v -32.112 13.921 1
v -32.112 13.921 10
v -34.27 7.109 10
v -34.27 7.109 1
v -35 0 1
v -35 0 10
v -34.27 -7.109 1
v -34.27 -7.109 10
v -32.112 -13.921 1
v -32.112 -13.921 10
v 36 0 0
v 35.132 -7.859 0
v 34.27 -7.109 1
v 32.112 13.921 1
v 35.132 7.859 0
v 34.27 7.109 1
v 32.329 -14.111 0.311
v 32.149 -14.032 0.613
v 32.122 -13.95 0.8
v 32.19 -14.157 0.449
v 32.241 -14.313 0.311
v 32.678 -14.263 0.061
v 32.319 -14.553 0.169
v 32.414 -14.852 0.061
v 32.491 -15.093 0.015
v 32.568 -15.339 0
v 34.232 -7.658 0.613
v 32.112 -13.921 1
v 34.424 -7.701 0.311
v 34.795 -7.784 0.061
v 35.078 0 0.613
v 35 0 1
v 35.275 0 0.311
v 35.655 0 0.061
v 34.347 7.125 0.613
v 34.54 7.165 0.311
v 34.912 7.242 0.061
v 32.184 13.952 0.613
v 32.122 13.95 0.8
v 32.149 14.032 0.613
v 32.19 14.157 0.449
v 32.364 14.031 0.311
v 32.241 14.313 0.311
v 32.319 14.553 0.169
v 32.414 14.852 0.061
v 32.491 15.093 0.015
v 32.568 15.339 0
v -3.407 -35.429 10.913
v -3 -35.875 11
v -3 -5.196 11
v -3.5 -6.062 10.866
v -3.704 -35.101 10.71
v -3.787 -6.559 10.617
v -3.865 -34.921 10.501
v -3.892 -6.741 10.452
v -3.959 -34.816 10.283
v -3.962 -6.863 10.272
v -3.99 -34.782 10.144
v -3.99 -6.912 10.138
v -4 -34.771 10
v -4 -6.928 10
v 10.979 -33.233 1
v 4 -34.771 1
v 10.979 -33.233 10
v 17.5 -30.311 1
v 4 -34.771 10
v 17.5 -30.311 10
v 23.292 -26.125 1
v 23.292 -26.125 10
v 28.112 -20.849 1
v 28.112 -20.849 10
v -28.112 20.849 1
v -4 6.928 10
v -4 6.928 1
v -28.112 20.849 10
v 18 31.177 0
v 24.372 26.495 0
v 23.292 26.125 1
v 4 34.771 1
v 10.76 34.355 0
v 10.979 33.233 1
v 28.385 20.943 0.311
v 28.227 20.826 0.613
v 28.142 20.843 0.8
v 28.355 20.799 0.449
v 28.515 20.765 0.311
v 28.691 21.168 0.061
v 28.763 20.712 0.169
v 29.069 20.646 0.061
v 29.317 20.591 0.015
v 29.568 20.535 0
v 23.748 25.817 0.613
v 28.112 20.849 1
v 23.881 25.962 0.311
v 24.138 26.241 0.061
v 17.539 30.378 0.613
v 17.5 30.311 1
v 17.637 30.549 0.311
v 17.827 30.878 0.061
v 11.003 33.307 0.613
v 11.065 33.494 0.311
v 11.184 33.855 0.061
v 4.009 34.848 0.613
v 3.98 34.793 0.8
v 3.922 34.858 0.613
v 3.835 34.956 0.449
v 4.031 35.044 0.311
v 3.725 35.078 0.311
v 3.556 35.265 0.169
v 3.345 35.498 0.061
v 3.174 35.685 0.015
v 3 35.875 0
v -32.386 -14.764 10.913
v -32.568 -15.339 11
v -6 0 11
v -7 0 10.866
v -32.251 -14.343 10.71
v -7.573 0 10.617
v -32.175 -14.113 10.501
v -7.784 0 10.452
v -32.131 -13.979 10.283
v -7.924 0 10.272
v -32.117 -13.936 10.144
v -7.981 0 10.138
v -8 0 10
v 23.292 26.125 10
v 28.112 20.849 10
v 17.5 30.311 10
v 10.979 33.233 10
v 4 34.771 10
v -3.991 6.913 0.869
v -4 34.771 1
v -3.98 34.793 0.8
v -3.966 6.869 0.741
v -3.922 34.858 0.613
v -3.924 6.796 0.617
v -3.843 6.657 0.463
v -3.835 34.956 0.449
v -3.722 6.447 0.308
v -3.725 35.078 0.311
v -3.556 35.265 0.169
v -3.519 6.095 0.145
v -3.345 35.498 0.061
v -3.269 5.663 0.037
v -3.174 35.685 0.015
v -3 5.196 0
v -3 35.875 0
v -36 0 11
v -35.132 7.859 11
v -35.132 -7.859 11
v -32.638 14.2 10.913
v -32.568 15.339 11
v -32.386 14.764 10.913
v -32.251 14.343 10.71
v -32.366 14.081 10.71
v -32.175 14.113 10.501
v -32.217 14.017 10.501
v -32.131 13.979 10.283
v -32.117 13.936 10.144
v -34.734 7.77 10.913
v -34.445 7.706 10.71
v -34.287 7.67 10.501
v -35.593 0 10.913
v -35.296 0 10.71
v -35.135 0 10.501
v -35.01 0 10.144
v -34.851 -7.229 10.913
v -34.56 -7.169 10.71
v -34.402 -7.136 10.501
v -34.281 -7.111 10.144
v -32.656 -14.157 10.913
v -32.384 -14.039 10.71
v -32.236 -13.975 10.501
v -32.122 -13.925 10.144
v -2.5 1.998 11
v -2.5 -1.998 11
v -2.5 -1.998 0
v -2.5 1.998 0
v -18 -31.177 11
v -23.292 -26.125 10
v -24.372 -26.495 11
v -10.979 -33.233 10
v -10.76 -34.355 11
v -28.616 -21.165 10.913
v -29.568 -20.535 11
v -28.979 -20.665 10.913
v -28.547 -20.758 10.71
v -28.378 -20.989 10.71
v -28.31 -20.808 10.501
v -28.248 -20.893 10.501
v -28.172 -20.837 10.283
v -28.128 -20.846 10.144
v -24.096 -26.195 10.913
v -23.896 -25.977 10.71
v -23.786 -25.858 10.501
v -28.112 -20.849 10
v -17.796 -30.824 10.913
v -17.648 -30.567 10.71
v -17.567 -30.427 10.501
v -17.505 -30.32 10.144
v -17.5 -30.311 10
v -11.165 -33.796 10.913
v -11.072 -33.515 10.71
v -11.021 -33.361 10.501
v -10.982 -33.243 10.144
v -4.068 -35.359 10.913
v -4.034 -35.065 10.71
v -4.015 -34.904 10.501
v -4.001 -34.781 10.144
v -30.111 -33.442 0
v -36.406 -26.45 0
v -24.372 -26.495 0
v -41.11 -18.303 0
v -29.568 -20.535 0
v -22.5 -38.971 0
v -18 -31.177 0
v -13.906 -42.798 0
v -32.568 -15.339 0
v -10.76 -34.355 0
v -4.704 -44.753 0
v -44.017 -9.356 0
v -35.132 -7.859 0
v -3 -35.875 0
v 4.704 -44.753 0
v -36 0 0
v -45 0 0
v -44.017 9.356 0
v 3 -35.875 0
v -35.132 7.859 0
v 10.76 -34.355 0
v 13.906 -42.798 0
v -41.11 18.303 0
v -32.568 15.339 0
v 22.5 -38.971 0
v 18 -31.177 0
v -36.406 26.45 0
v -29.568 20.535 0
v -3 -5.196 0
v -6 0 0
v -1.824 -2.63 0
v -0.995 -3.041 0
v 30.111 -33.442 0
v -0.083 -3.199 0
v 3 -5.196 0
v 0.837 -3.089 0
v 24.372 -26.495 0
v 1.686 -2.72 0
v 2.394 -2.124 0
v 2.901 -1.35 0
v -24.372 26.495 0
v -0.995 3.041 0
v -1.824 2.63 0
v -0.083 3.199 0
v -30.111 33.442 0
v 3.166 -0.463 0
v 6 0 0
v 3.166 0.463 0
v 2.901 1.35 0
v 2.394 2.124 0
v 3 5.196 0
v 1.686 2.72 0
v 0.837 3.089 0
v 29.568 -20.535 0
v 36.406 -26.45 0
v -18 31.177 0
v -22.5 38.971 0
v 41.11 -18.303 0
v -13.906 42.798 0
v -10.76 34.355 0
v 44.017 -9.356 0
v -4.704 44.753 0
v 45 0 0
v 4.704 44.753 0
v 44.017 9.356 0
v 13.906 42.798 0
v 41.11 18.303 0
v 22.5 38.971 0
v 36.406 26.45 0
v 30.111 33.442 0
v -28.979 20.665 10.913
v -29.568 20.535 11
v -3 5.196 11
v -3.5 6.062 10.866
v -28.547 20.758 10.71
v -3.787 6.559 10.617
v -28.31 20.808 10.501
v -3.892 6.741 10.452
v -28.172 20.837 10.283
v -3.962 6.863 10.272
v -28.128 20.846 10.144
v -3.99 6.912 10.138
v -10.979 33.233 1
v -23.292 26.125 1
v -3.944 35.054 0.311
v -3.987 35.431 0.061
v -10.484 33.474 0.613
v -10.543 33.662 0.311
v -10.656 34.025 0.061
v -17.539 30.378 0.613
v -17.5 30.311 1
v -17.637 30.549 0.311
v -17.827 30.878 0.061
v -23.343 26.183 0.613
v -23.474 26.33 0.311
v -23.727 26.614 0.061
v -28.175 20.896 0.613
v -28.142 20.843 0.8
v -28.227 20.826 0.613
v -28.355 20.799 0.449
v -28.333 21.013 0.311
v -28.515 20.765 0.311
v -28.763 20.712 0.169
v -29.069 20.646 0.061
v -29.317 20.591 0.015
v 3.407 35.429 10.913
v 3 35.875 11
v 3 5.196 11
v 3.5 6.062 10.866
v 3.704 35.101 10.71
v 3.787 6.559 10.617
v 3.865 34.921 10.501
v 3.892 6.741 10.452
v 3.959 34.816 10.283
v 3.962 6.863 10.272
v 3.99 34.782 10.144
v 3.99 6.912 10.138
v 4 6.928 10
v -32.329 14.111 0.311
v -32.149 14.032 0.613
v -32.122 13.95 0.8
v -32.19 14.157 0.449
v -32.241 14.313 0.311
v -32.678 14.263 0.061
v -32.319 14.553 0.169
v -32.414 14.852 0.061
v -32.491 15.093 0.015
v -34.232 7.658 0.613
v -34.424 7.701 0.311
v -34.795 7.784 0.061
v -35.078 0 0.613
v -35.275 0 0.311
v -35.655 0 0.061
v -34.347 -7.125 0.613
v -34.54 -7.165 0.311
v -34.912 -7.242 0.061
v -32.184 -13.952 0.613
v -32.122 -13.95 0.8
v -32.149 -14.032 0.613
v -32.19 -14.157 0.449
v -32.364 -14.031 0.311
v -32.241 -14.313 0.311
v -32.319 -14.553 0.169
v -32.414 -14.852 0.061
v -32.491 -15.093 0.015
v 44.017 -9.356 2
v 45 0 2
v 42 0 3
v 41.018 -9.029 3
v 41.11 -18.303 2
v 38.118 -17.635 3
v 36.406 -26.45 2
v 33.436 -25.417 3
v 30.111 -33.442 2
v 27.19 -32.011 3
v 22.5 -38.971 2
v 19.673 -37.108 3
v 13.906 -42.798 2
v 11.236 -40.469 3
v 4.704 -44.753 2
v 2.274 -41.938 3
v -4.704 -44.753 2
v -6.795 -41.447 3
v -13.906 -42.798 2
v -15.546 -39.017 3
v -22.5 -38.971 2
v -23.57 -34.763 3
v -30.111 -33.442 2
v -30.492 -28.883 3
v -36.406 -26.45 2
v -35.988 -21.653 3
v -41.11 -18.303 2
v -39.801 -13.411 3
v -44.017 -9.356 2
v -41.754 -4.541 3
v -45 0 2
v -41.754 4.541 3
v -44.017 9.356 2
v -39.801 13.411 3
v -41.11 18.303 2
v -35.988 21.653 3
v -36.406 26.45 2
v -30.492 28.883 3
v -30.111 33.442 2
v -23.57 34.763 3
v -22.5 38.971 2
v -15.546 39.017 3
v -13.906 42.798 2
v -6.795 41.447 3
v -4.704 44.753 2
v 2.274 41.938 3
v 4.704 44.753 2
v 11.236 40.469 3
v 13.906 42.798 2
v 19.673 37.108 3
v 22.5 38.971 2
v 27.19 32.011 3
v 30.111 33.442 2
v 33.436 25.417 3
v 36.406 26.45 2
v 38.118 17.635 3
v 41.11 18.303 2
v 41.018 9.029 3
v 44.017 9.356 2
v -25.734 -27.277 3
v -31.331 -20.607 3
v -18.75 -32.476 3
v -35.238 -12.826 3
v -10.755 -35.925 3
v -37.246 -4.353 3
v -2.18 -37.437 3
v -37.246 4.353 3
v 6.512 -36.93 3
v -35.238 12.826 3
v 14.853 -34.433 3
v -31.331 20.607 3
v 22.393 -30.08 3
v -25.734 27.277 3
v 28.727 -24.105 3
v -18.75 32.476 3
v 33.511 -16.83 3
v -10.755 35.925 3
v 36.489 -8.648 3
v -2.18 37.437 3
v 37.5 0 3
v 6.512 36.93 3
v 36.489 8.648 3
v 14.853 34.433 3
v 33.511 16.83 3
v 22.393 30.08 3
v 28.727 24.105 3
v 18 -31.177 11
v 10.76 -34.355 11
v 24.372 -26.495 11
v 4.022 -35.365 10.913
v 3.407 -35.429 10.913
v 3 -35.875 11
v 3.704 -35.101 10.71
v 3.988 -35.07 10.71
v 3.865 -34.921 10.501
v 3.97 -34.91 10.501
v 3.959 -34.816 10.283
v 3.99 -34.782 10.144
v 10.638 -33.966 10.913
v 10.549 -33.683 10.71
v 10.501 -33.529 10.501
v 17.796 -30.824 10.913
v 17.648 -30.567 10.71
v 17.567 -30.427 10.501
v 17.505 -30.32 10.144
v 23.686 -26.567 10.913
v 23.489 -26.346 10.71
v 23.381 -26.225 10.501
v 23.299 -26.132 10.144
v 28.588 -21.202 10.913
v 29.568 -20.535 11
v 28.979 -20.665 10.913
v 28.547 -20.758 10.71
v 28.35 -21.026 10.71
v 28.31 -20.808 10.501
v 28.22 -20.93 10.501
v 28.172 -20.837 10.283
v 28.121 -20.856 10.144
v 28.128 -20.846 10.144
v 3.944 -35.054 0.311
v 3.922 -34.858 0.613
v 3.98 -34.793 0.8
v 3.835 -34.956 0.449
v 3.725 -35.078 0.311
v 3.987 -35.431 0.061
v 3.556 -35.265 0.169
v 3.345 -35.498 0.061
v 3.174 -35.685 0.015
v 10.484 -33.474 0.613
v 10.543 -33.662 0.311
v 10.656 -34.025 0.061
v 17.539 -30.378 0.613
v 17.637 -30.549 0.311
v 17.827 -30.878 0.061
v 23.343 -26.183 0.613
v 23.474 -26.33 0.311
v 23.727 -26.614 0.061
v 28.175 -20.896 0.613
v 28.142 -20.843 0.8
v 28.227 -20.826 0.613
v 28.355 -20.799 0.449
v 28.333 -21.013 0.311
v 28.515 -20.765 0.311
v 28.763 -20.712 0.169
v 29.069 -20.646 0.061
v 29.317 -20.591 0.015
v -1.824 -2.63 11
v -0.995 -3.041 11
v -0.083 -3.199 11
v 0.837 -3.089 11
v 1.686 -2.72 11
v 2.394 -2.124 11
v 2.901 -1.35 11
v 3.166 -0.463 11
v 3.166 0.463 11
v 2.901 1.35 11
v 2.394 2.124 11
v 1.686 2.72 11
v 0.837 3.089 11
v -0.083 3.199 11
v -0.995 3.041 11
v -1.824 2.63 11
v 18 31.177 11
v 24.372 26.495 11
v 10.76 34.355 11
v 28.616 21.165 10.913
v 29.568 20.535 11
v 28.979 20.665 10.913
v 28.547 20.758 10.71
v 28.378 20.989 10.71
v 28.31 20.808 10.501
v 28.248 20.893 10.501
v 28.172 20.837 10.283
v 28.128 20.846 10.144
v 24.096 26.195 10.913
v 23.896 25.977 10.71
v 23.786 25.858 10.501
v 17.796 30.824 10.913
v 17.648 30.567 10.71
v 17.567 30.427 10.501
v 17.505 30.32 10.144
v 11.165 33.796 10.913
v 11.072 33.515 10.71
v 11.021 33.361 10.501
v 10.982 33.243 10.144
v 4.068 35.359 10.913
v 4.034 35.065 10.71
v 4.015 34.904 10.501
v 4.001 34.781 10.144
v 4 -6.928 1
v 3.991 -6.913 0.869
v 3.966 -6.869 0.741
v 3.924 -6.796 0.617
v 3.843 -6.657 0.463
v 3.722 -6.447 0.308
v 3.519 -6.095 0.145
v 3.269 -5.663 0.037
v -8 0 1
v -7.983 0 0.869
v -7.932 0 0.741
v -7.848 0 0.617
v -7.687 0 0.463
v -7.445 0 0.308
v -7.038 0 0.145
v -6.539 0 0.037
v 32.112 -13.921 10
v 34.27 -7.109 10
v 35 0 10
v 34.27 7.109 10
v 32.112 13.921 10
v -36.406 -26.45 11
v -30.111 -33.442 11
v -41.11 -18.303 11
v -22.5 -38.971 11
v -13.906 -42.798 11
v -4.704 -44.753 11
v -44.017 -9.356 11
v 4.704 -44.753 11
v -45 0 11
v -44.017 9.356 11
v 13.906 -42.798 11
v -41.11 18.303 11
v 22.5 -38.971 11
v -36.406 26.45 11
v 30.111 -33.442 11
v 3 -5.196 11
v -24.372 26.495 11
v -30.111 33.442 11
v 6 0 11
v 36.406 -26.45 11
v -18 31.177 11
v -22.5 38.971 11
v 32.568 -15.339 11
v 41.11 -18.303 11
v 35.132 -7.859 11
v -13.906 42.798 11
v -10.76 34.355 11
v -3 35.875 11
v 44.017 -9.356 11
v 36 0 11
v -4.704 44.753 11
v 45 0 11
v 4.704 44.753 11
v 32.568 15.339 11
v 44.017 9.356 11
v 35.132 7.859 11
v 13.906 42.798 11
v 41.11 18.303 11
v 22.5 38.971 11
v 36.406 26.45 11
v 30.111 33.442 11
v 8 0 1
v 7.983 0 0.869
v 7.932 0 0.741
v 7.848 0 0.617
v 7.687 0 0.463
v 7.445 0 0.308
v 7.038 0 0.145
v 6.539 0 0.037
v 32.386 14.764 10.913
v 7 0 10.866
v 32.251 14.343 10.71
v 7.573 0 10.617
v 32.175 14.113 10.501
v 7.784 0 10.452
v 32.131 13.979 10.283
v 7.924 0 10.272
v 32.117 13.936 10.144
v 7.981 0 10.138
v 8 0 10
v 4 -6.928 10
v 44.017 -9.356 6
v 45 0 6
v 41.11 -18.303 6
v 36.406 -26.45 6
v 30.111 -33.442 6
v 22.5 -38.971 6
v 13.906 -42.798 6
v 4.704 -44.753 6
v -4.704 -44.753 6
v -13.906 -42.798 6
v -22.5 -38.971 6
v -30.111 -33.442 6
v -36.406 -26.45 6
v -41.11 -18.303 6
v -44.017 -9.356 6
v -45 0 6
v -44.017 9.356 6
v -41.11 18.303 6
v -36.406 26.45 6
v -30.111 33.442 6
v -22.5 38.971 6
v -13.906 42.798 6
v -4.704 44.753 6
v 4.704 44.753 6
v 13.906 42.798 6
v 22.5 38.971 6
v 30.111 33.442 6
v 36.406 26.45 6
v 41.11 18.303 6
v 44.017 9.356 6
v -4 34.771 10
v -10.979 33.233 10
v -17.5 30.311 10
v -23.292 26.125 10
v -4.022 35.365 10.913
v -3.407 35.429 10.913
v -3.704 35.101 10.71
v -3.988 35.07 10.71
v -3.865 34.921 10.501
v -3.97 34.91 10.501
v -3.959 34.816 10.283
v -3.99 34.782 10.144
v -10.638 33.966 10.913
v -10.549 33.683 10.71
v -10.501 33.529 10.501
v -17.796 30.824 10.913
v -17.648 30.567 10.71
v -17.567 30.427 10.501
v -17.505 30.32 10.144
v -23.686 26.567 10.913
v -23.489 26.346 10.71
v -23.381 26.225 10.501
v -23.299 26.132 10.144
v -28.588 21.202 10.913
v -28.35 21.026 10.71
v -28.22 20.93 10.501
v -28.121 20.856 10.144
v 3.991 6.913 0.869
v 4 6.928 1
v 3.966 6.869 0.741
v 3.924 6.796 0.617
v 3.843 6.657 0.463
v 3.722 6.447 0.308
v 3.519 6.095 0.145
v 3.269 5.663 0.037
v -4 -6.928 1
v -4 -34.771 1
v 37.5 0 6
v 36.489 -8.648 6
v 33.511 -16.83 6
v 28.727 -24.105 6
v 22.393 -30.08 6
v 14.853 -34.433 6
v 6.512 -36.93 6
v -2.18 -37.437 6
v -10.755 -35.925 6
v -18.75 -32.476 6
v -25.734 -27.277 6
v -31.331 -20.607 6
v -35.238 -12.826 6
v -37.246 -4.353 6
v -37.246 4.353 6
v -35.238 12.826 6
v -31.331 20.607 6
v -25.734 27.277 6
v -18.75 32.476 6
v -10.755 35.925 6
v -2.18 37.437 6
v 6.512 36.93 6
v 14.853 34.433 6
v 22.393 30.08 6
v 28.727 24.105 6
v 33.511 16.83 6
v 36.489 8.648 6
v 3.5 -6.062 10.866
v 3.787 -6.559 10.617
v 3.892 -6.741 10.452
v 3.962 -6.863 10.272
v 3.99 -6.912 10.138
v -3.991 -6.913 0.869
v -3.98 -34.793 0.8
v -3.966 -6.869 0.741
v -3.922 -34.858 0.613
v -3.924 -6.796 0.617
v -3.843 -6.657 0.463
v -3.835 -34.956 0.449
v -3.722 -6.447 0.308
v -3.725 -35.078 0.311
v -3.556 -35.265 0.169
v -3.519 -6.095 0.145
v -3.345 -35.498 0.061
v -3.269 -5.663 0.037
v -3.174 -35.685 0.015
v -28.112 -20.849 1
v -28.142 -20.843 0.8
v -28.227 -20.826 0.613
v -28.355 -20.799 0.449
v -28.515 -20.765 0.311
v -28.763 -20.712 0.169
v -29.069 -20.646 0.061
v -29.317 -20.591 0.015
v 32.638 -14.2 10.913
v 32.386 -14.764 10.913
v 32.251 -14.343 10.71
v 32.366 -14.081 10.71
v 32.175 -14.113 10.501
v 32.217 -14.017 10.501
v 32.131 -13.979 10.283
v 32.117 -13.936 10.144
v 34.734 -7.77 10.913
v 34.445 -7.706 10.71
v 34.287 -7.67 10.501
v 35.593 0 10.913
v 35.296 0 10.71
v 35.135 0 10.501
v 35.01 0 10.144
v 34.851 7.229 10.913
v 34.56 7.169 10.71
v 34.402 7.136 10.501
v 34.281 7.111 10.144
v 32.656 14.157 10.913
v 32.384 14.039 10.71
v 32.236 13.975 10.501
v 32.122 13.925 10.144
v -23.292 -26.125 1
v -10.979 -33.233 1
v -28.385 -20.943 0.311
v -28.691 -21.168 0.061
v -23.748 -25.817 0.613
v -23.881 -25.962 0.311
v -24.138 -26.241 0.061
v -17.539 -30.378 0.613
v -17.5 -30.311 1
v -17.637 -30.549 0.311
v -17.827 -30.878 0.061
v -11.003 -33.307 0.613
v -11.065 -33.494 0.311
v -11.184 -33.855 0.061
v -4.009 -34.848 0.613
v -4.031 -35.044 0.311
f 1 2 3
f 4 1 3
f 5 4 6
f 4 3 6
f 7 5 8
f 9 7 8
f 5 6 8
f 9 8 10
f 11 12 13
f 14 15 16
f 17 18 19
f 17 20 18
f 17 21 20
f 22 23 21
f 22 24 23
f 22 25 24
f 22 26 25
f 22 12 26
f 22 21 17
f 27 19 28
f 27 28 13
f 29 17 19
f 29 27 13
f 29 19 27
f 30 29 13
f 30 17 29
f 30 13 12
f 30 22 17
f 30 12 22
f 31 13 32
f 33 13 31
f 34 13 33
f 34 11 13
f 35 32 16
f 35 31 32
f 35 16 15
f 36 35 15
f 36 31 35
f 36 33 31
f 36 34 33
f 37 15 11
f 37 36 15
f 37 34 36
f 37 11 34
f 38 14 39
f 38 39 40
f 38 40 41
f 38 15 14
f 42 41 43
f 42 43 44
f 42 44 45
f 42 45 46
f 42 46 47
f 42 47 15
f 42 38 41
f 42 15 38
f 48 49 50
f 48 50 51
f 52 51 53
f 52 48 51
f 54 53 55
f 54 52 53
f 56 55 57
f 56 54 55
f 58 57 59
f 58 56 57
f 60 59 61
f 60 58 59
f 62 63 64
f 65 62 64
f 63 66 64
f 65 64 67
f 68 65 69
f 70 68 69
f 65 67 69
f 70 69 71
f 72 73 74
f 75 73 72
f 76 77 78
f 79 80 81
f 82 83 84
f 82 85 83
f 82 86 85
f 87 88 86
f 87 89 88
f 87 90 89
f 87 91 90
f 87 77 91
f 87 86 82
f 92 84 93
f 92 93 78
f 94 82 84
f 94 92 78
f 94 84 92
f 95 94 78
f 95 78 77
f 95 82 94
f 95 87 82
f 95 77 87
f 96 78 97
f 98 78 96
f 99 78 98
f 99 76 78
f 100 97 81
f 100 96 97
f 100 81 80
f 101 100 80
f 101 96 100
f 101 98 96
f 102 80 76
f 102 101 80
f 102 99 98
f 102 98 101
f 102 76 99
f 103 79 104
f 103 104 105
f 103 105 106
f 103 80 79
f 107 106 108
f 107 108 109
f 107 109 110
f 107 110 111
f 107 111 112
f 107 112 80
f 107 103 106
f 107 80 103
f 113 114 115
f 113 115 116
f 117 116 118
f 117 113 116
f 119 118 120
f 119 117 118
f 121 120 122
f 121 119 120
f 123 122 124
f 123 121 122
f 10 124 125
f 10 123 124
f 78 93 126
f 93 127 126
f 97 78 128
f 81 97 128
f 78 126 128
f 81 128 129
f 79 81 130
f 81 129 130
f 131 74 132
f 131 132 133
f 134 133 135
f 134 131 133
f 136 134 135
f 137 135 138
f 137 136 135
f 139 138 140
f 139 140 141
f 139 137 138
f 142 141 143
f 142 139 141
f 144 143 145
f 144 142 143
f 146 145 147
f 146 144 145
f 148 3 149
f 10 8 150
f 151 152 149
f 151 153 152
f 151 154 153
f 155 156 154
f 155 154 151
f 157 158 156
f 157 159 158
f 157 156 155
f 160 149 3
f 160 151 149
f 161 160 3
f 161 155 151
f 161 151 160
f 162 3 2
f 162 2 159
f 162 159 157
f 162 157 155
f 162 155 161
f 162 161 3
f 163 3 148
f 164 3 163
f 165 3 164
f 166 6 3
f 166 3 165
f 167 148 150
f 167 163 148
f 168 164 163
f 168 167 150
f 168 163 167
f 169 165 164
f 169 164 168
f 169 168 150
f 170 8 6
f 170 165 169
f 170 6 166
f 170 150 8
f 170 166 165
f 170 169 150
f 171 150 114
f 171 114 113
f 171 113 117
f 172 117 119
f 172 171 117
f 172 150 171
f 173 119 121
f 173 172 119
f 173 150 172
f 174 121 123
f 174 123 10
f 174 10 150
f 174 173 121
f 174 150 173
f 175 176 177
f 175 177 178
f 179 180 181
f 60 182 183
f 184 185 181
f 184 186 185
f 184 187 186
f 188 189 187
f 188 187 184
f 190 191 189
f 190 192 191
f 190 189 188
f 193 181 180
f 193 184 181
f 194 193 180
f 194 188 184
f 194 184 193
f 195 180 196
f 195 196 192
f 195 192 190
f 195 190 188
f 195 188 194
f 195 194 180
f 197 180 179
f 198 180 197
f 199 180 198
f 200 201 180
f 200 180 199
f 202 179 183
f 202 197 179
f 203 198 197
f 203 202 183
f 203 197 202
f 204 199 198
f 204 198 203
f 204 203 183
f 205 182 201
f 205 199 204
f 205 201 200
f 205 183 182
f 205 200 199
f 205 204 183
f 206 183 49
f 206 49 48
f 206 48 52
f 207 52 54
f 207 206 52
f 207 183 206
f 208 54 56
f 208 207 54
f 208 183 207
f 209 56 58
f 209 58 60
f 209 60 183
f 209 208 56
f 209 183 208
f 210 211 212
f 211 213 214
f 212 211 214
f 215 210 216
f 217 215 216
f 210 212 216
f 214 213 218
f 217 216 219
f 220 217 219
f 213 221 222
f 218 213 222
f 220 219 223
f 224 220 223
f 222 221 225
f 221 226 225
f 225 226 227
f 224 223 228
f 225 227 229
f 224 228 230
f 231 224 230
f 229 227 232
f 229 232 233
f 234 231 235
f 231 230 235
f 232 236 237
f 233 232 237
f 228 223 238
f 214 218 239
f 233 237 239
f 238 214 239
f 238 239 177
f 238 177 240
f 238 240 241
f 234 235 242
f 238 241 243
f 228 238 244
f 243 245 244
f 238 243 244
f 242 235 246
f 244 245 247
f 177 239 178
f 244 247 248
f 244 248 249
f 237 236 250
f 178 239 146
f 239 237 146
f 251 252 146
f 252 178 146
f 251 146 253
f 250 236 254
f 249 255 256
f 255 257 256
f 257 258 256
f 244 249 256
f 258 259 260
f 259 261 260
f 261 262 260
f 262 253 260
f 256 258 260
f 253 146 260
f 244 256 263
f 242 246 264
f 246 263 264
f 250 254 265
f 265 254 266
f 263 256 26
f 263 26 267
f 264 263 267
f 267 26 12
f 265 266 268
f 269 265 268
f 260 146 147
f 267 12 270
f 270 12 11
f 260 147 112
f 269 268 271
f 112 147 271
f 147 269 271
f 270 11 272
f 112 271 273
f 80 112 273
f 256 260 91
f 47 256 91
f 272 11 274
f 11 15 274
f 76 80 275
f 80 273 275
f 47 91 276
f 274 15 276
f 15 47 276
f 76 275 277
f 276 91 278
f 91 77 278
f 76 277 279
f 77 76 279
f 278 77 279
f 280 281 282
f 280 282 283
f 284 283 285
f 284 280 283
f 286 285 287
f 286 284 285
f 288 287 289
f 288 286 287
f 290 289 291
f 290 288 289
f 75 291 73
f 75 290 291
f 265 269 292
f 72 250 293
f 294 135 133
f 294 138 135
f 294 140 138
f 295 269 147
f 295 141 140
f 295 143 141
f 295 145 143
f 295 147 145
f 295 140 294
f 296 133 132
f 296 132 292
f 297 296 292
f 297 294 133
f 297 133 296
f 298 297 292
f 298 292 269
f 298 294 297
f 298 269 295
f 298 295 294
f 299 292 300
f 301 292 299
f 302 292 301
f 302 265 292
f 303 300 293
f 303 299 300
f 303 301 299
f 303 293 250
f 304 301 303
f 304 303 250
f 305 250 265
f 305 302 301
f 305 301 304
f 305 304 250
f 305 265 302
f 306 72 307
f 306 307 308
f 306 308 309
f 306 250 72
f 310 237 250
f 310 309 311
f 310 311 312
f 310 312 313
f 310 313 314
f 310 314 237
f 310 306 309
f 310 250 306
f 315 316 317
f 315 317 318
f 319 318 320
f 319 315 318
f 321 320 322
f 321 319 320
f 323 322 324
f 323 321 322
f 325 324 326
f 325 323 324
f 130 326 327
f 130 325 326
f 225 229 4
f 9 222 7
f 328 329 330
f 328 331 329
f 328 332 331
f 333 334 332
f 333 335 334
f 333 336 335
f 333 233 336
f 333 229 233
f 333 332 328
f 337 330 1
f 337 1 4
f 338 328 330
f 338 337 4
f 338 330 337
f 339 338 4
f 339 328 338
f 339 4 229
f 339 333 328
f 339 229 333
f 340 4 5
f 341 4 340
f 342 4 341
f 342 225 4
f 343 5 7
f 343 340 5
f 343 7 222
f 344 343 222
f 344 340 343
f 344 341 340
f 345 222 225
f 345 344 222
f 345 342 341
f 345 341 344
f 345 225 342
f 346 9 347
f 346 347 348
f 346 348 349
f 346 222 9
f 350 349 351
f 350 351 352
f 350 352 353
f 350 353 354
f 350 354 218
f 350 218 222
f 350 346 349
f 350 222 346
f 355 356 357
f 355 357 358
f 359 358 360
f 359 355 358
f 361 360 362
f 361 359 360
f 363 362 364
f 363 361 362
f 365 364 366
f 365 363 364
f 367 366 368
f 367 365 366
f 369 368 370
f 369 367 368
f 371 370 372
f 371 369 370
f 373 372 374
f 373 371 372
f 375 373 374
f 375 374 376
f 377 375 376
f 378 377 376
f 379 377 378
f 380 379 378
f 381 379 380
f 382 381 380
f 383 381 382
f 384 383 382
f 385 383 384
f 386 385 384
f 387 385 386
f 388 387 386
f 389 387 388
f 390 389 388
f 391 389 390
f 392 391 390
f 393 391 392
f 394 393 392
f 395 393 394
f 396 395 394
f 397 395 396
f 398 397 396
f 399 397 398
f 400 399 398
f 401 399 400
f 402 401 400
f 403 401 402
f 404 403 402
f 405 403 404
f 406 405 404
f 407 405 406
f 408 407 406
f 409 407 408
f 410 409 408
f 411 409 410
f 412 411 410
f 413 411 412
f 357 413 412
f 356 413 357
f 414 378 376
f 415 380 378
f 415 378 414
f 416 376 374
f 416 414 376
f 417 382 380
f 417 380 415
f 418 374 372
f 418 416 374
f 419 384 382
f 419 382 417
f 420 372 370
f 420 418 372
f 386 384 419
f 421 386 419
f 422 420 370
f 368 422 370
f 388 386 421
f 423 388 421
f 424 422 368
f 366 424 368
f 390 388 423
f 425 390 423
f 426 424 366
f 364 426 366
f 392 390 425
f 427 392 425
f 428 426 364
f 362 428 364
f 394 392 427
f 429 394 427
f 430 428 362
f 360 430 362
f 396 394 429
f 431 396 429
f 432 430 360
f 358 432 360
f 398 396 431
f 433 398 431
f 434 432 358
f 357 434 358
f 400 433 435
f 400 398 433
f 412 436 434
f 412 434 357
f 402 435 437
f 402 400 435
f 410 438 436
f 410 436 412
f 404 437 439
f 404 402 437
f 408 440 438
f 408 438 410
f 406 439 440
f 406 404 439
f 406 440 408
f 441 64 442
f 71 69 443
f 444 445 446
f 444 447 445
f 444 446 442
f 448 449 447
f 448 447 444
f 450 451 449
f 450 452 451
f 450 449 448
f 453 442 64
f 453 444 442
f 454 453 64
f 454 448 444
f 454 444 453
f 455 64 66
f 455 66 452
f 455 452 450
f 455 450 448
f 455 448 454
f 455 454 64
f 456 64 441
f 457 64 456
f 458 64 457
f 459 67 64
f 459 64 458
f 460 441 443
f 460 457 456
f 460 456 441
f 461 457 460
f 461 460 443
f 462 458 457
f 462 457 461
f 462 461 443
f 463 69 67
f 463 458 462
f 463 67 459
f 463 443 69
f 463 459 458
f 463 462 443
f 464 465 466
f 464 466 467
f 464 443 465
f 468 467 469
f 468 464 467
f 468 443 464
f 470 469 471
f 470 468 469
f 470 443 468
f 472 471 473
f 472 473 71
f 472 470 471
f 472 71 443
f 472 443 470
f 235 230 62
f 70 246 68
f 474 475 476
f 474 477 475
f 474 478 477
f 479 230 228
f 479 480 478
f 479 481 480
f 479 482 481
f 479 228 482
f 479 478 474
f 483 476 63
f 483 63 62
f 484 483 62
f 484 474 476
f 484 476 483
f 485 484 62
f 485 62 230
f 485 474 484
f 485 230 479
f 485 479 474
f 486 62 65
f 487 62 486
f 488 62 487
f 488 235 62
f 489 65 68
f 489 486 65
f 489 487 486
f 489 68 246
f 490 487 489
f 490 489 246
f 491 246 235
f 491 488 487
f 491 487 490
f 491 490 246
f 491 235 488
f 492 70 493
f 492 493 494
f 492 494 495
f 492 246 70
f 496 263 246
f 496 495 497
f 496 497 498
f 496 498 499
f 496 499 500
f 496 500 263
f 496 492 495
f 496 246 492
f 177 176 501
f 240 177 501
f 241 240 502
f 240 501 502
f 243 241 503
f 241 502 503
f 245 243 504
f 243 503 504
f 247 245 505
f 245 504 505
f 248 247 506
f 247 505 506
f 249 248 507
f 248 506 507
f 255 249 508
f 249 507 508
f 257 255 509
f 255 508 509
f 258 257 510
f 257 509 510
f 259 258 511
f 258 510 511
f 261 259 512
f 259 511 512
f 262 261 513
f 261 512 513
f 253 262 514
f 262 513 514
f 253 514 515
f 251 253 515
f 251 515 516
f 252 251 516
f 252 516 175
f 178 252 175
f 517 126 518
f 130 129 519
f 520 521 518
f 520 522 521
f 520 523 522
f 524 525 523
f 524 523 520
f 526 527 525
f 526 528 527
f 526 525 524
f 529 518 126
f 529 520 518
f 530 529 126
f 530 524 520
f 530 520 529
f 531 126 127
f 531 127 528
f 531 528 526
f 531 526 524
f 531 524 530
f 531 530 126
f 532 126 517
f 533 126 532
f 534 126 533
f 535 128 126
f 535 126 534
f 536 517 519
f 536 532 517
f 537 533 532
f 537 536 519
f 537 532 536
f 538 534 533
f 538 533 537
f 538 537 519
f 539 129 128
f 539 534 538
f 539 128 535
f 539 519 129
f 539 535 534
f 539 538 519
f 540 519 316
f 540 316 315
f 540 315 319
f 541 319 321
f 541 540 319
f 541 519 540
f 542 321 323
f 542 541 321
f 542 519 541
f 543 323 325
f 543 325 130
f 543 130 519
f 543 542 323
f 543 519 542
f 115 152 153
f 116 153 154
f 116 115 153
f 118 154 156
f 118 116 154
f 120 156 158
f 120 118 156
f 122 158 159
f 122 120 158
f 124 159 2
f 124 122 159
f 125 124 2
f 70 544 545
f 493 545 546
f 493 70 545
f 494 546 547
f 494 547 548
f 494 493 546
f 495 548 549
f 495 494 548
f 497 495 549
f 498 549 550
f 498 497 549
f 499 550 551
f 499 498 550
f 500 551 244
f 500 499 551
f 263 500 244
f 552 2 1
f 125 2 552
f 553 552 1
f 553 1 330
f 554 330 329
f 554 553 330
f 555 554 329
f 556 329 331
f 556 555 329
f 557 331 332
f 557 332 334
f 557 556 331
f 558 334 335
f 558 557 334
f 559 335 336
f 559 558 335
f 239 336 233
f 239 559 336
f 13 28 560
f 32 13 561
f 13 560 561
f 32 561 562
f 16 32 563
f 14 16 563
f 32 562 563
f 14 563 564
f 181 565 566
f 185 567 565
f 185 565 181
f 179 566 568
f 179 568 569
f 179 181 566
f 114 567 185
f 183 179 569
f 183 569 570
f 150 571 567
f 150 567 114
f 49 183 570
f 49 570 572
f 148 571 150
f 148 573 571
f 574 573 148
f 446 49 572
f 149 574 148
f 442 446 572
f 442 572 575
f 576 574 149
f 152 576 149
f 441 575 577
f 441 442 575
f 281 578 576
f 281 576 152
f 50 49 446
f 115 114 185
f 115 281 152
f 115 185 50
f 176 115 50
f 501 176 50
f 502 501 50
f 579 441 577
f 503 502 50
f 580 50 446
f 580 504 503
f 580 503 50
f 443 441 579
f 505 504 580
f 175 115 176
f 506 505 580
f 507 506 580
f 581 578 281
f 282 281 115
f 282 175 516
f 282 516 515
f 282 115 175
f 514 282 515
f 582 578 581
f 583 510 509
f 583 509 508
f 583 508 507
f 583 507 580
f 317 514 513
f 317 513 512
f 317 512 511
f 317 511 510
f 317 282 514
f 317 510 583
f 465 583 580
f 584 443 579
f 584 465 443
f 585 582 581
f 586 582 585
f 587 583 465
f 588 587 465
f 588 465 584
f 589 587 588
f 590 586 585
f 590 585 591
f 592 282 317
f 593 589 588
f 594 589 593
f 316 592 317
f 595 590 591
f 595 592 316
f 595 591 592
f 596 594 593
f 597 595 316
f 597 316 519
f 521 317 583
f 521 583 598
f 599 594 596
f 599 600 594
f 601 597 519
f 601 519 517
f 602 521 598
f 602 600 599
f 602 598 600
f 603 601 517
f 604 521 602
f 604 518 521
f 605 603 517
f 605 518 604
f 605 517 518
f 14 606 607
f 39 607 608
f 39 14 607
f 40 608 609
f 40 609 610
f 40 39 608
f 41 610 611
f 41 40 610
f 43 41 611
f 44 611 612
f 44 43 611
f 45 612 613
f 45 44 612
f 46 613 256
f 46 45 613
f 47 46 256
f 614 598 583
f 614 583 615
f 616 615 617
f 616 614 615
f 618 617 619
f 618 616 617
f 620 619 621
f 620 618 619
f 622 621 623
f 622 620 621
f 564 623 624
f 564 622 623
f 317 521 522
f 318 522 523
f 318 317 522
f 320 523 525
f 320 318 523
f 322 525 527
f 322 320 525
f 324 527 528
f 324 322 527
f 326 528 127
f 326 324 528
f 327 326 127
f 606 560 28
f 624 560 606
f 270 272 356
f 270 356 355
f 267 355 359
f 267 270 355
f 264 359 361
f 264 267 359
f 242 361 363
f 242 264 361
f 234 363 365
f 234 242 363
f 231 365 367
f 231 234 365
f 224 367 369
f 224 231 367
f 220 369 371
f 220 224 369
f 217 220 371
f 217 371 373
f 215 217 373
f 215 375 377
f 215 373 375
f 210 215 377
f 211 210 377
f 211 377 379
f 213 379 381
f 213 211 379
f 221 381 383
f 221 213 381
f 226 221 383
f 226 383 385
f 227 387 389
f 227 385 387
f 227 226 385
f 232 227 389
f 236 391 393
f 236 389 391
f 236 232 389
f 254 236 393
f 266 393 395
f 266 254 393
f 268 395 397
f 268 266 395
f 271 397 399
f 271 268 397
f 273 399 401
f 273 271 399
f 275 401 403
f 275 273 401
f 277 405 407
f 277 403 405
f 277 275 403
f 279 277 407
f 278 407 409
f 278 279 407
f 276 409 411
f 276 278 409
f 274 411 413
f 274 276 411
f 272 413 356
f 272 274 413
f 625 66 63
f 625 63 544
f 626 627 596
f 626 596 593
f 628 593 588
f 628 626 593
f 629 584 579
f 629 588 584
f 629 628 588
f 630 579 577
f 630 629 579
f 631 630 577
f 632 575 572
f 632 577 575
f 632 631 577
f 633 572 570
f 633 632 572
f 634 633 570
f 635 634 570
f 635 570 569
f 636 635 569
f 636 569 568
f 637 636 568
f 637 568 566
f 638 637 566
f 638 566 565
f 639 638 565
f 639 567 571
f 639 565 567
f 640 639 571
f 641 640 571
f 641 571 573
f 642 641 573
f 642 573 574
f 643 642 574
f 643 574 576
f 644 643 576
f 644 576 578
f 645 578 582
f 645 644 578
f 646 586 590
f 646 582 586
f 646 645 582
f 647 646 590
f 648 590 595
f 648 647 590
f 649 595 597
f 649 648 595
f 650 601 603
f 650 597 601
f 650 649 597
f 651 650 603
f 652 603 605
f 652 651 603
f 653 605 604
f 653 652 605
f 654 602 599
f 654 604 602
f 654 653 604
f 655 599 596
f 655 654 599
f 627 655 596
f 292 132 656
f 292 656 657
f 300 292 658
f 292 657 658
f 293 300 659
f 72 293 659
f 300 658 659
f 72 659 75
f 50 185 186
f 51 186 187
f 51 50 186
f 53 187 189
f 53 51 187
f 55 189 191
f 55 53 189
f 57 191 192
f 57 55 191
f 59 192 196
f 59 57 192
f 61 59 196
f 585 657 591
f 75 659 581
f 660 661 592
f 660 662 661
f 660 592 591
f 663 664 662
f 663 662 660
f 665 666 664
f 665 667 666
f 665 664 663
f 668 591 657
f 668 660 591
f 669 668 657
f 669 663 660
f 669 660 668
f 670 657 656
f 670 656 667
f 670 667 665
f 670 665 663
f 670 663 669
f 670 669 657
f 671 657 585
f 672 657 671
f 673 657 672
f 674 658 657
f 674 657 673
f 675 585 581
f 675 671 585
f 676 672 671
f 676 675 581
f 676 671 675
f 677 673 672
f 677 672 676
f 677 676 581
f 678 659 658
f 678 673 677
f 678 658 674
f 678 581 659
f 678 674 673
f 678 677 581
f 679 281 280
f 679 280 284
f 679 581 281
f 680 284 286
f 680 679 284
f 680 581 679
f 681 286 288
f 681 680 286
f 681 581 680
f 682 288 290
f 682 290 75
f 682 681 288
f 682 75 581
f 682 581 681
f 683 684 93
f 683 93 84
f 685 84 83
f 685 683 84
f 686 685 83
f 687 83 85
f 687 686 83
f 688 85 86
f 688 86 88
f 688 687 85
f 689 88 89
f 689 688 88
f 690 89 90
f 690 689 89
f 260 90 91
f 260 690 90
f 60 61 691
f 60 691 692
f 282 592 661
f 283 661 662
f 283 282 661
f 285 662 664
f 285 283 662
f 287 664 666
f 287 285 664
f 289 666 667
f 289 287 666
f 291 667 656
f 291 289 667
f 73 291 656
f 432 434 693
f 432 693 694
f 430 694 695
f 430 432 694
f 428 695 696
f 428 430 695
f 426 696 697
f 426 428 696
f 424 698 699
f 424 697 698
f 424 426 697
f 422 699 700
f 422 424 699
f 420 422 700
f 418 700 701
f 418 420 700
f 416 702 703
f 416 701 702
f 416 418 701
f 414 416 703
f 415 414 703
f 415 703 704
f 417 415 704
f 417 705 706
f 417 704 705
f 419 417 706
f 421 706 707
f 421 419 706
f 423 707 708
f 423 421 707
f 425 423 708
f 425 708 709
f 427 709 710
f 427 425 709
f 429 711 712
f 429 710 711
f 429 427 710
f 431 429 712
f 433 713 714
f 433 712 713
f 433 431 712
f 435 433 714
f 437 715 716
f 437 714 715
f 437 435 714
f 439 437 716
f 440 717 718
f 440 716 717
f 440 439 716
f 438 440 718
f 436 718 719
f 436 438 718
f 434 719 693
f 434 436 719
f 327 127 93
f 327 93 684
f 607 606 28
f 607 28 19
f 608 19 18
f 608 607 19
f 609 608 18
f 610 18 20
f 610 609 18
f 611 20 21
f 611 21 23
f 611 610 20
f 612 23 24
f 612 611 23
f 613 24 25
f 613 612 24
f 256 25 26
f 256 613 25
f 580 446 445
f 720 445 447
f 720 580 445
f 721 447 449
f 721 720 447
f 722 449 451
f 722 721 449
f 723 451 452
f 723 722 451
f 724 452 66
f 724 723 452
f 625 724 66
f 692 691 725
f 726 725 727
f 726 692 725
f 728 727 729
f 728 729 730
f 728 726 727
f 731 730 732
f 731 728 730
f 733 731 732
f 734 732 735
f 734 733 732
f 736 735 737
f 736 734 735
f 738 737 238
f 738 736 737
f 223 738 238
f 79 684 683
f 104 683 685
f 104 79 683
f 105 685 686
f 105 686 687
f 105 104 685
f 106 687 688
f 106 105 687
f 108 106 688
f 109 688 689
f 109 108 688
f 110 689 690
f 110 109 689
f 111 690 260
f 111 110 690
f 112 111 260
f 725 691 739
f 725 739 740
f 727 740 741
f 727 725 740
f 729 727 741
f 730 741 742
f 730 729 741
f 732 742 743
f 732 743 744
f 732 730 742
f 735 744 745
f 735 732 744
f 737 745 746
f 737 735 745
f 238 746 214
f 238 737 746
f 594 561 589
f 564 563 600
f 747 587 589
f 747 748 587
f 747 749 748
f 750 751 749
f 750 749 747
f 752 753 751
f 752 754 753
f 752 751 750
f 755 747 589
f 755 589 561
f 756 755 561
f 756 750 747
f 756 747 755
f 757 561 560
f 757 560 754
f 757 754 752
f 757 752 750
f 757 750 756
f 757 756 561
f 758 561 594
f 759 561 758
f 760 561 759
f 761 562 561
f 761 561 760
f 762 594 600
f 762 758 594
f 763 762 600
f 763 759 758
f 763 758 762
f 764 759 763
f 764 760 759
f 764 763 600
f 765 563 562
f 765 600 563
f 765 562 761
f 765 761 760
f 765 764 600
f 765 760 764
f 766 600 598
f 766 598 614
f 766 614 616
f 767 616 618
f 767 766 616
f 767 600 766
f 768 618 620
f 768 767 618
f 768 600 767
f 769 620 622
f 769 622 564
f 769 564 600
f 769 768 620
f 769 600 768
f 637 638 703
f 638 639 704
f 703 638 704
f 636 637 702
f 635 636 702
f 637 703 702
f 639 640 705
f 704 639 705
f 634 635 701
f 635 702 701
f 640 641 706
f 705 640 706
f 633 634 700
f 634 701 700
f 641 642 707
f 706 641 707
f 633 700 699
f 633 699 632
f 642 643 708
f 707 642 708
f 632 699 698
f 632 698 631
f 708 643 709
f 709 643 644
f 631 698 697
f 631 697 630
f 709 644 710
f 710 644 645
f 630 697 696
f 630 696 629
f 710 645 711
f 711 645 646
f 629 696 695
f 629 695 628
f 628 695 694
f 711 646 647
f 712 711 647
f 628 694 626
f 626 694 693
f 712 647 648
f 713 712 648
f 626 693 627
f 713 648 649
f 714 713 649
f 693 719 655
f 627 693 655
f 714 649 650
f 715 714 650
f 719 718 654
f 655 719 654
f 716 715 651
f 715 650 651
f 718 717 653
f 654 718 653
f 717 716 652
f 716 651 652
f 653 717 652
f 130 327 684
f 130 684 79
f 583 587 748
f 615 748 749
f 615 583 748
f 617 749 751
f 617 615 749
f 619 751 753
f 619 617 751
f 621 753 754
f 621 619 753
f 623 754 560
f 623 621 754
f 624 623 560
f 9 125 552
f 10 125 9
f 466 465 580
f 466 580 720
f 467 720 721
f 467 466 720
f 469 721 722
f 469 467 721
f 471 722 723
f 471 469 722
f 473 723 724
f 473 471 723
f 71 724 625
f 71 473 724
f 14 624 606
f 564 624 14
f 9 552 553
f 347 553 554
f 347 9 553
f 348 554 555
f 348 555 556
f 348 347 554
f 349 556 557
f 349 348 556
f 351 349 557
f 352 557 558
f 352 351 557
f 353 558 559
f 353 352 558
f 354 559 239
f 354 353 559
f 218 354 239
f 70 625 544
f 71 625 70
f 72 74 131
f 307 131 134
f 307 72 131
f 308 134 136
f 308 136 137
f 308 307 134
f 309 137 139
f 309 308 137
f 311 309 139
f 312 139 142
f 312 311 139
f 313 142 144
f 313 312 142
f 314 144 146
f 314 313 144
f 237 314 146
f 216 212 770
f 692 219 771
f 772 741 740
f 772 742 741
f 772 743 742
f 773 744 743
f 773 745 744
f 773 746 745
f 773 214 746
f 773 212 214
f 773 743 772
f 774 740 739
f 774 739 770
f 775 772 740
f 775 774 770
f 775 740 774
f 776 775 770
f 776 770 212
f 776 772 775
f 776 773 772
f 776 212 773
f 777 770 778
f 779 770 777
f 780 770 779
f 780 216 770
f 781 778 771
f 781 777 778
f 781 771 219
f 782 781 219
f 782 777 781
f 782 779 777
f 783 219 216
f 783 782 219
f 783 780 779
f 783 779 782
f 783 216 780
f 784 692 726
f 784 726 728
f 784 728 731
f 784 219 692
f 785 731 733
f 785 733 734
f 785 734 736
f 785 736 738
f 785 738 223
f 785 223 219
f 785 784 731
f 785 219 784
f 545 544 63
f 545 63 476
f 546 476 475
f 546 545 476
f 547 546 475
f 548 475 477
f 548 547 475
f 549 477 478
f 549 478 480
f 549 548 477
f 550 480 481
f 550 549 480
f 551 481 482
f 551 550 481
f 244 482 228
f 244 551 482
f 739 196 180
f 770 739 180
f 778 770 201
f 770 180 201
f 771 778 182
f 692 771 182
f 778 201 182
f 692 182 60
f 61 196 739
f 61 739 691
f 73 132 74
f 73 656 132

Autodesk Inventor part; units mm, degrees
ref_plane "YZ Plane" through (0, 0, 0) normal (1, 0, 0) x (0, 1, 0)
ref_plane "XZ Plane" through (0, 0, 0) normal (0, 1, 0) x (-1, 0, 0)
ref_plane "XY Plane" through (0, 0, 0) normal (0, 0, 1) x (1, 0, 0)
sketch "스케치1" plane through (0, 0, 0) normal (0, 0, 1) x (1, 0, 0)
  circle A0 centre (0, 0) radius 45
  dimension "d0" = 90
extrude "돌출1" add sketch "스케치1" along normal blind 3
sketch "스케치2" plane through (0, 0, 3) normal (0, 0, 1) x (1, 0, 0)
  circle A0 centre (0, 0) radius 45 projected
  circle A1 centre (0, 0) radius 37.5
  dimension "d3" = 75
extrude "돌출2" add sketch "스케치2" along normal blind 3 contours A1
sketch "스케치3" plane through (0, 0, 6) normal (0, 0, 1) x (1, 0, 0)
  circle A0 centre (0, 0) radius 37.5 projected
  circle A1 centre (0, 0) radius 45
  dimension "d6" = 90
extrude "돌출3" add sketch "스케치3" along normal blind 5 contours A0 | A1
sketch "스케치4" plane through (0, 0, 11) normal (0, 0, 1) x (1, 0, 0)
  circle A0 centre (0, 0) radius 45 projected
  circle A1 centre (0, 0) radius 3.2
  line L0 (-2.5, -1.9975) -> (-2.5, 1.9975)
  circle A2 centre (0, 0) radius 35
  line L1 (4, 0) -> (-4, 0)
  line L2 (-4, 0) -> (-4, -35)
  line L3 (-4, -35) -> (4, -35)
  line L4 (4, -35) -> (4, 0)
  line L5 (32.3109, -14.0359) -> (2, 3.4641)
  line L6 (-2, -3.4641) -> (28.3109, -20.9641)
  line L7 (28.3109, -20.9641) -> (32.3109, -14.0359)
  line L8 (2, 3.4641) -> (-2, -3.4641)
  line L9 (28.3109, 20.9641) -> (-2, 3.4641)
  line L10 (2, -3.4641) -> (32.3109, 14.0359)
  line L11 (32.3109, 14.0359) -> (28.3109, 20.9641)
  line L12 (-2, 3.4641) -> (2, -3.4641)
  line L13 (-4, 35) -> (-4, 0)
  line L14 (4, 0) -> (4, 35)
  line L15 (4, 35) -> (-4, 35)
  line L16 (-4, 0) -> (4, 0)
  line L17 (-32.3109, 14.0359) -> (-2, -3.4641)
  line L18 (2, 3.4641) -> (-28.3109, 20.9641)
  line L19 (-28.3109, 20.9641) -> (-32.3109, 14.0359)
  line L20 (-2, -3.4641) -> (2, 3.4641)
  line L21 (-28.3109, -20.9641) -> (2, -3.4641)
  line L22 (-2, 3.4641) -> (-32.3109, -14.0359)
  line L23 (-32.3109, -14.0359) -> (-28.3109, -20.9641)
  line L24 (2, -3.4641) -> (-2, 3.4641)
  point P0 (32.1123, 13.9212)
  point P1 (8, 0)
  point P2 (32.1123, -13.9212)
  point P3 (4, 34.7707)
  point P4 (4, 6.9282)
  point P5 (28.1123, 20.8494)
  point P6 (-28.1123, 20.8494)
  point P7 (-4, 6.9282)
  point P8 (-4, 34.7707)
  point P9 (-32.1123, -13.9212)
  point P10 (-8, 0)
  point P11 (-32.1123, 13.9212)
  point P12 (-4, -6.9282)
  point P13 (-28.1123, -20.8494)
  point P14 (-4, -34.7707)
  point P15 (28.1123, -20.8494)
  point P16 (4, -6.9282)
  point P17 (4, -34.7707)
  point P18 (0, 0)
  point P19 (0, 0)
  point P20 (0, 0)
  point P21 (0, 0)
  point P22 (0, 0)
  point P23 (0, 0)
  dimension "d10" = 6.4
  dimension "d11" = 2.5
  dimension "d14" = 70
  dimension "d15" = 8
  dimension "d16" = 35
  dimension "d19" = 360
extrude "돌출4" cut sketch "스케치4" against normal through all contours L1 L8 A1 | A1 L12 L1 | L8 L12 A1 | A1 L8 L12 | L8 A1 L0 L1 | L1 L0 A1 L12 | L6 A2 L4 | L10 A2 L5 | L14 A2 L9 | L18 A2 L13 | L2 A2 L21 | L22 A2 L17
fillet "모깎기2" radius 1 36 edges at (-20.0561, -6.9606, 11) (-16.0561, -13.8888, 11) (-35, 0, 11) (-20.0561, 6.9606, 11) (-16.0561, 13.8888, 11) (-17.5, 30.3109, 11) (-4, 20.8494, 11) (4, 20.8494, 11) (17.5, 30.3109, 11) (16.0561, 13.8888, 11) (20.0561, 6.9606, 11) (20.0561, 6.9606, 0) (35, 0, 11) (4, 20.8494, 0) (17.5, 30.3109, 0) (20.0561, -6.9606, 11) (16.0561, -13.8888, 11) (4, -20.8494, 11) (4, -20.8494, 0) (16.0561, -13.8888, 0) (-4, -20.8494, 11) (-16.0561, -13.8888, 0) (-20.0561, 6.9606, 0) (-17.5, 30.3109, 0) (-35, 0, 0) (-17.5, -30.3109, 0) (-17.5, -30.3109, 11) (-4, -20.8494, 0) (17.5, -30.3109, 11) (17.5, -30.3109, 0) (35, 0, 0) (20.0561, -6.9606, 0) (-4, 20.8494, 0) (-16.0561, 13.8888, 0) (16.0561, 13.8888, 0) (-20.0561, -6.9606, 0)
chamfer "모따기1" distance 3 distance2 1 1 edges at (-45, 0, 3) measured on face at (42.1722, 3.1187, 3)
properties part number "_3D 인쇄"
